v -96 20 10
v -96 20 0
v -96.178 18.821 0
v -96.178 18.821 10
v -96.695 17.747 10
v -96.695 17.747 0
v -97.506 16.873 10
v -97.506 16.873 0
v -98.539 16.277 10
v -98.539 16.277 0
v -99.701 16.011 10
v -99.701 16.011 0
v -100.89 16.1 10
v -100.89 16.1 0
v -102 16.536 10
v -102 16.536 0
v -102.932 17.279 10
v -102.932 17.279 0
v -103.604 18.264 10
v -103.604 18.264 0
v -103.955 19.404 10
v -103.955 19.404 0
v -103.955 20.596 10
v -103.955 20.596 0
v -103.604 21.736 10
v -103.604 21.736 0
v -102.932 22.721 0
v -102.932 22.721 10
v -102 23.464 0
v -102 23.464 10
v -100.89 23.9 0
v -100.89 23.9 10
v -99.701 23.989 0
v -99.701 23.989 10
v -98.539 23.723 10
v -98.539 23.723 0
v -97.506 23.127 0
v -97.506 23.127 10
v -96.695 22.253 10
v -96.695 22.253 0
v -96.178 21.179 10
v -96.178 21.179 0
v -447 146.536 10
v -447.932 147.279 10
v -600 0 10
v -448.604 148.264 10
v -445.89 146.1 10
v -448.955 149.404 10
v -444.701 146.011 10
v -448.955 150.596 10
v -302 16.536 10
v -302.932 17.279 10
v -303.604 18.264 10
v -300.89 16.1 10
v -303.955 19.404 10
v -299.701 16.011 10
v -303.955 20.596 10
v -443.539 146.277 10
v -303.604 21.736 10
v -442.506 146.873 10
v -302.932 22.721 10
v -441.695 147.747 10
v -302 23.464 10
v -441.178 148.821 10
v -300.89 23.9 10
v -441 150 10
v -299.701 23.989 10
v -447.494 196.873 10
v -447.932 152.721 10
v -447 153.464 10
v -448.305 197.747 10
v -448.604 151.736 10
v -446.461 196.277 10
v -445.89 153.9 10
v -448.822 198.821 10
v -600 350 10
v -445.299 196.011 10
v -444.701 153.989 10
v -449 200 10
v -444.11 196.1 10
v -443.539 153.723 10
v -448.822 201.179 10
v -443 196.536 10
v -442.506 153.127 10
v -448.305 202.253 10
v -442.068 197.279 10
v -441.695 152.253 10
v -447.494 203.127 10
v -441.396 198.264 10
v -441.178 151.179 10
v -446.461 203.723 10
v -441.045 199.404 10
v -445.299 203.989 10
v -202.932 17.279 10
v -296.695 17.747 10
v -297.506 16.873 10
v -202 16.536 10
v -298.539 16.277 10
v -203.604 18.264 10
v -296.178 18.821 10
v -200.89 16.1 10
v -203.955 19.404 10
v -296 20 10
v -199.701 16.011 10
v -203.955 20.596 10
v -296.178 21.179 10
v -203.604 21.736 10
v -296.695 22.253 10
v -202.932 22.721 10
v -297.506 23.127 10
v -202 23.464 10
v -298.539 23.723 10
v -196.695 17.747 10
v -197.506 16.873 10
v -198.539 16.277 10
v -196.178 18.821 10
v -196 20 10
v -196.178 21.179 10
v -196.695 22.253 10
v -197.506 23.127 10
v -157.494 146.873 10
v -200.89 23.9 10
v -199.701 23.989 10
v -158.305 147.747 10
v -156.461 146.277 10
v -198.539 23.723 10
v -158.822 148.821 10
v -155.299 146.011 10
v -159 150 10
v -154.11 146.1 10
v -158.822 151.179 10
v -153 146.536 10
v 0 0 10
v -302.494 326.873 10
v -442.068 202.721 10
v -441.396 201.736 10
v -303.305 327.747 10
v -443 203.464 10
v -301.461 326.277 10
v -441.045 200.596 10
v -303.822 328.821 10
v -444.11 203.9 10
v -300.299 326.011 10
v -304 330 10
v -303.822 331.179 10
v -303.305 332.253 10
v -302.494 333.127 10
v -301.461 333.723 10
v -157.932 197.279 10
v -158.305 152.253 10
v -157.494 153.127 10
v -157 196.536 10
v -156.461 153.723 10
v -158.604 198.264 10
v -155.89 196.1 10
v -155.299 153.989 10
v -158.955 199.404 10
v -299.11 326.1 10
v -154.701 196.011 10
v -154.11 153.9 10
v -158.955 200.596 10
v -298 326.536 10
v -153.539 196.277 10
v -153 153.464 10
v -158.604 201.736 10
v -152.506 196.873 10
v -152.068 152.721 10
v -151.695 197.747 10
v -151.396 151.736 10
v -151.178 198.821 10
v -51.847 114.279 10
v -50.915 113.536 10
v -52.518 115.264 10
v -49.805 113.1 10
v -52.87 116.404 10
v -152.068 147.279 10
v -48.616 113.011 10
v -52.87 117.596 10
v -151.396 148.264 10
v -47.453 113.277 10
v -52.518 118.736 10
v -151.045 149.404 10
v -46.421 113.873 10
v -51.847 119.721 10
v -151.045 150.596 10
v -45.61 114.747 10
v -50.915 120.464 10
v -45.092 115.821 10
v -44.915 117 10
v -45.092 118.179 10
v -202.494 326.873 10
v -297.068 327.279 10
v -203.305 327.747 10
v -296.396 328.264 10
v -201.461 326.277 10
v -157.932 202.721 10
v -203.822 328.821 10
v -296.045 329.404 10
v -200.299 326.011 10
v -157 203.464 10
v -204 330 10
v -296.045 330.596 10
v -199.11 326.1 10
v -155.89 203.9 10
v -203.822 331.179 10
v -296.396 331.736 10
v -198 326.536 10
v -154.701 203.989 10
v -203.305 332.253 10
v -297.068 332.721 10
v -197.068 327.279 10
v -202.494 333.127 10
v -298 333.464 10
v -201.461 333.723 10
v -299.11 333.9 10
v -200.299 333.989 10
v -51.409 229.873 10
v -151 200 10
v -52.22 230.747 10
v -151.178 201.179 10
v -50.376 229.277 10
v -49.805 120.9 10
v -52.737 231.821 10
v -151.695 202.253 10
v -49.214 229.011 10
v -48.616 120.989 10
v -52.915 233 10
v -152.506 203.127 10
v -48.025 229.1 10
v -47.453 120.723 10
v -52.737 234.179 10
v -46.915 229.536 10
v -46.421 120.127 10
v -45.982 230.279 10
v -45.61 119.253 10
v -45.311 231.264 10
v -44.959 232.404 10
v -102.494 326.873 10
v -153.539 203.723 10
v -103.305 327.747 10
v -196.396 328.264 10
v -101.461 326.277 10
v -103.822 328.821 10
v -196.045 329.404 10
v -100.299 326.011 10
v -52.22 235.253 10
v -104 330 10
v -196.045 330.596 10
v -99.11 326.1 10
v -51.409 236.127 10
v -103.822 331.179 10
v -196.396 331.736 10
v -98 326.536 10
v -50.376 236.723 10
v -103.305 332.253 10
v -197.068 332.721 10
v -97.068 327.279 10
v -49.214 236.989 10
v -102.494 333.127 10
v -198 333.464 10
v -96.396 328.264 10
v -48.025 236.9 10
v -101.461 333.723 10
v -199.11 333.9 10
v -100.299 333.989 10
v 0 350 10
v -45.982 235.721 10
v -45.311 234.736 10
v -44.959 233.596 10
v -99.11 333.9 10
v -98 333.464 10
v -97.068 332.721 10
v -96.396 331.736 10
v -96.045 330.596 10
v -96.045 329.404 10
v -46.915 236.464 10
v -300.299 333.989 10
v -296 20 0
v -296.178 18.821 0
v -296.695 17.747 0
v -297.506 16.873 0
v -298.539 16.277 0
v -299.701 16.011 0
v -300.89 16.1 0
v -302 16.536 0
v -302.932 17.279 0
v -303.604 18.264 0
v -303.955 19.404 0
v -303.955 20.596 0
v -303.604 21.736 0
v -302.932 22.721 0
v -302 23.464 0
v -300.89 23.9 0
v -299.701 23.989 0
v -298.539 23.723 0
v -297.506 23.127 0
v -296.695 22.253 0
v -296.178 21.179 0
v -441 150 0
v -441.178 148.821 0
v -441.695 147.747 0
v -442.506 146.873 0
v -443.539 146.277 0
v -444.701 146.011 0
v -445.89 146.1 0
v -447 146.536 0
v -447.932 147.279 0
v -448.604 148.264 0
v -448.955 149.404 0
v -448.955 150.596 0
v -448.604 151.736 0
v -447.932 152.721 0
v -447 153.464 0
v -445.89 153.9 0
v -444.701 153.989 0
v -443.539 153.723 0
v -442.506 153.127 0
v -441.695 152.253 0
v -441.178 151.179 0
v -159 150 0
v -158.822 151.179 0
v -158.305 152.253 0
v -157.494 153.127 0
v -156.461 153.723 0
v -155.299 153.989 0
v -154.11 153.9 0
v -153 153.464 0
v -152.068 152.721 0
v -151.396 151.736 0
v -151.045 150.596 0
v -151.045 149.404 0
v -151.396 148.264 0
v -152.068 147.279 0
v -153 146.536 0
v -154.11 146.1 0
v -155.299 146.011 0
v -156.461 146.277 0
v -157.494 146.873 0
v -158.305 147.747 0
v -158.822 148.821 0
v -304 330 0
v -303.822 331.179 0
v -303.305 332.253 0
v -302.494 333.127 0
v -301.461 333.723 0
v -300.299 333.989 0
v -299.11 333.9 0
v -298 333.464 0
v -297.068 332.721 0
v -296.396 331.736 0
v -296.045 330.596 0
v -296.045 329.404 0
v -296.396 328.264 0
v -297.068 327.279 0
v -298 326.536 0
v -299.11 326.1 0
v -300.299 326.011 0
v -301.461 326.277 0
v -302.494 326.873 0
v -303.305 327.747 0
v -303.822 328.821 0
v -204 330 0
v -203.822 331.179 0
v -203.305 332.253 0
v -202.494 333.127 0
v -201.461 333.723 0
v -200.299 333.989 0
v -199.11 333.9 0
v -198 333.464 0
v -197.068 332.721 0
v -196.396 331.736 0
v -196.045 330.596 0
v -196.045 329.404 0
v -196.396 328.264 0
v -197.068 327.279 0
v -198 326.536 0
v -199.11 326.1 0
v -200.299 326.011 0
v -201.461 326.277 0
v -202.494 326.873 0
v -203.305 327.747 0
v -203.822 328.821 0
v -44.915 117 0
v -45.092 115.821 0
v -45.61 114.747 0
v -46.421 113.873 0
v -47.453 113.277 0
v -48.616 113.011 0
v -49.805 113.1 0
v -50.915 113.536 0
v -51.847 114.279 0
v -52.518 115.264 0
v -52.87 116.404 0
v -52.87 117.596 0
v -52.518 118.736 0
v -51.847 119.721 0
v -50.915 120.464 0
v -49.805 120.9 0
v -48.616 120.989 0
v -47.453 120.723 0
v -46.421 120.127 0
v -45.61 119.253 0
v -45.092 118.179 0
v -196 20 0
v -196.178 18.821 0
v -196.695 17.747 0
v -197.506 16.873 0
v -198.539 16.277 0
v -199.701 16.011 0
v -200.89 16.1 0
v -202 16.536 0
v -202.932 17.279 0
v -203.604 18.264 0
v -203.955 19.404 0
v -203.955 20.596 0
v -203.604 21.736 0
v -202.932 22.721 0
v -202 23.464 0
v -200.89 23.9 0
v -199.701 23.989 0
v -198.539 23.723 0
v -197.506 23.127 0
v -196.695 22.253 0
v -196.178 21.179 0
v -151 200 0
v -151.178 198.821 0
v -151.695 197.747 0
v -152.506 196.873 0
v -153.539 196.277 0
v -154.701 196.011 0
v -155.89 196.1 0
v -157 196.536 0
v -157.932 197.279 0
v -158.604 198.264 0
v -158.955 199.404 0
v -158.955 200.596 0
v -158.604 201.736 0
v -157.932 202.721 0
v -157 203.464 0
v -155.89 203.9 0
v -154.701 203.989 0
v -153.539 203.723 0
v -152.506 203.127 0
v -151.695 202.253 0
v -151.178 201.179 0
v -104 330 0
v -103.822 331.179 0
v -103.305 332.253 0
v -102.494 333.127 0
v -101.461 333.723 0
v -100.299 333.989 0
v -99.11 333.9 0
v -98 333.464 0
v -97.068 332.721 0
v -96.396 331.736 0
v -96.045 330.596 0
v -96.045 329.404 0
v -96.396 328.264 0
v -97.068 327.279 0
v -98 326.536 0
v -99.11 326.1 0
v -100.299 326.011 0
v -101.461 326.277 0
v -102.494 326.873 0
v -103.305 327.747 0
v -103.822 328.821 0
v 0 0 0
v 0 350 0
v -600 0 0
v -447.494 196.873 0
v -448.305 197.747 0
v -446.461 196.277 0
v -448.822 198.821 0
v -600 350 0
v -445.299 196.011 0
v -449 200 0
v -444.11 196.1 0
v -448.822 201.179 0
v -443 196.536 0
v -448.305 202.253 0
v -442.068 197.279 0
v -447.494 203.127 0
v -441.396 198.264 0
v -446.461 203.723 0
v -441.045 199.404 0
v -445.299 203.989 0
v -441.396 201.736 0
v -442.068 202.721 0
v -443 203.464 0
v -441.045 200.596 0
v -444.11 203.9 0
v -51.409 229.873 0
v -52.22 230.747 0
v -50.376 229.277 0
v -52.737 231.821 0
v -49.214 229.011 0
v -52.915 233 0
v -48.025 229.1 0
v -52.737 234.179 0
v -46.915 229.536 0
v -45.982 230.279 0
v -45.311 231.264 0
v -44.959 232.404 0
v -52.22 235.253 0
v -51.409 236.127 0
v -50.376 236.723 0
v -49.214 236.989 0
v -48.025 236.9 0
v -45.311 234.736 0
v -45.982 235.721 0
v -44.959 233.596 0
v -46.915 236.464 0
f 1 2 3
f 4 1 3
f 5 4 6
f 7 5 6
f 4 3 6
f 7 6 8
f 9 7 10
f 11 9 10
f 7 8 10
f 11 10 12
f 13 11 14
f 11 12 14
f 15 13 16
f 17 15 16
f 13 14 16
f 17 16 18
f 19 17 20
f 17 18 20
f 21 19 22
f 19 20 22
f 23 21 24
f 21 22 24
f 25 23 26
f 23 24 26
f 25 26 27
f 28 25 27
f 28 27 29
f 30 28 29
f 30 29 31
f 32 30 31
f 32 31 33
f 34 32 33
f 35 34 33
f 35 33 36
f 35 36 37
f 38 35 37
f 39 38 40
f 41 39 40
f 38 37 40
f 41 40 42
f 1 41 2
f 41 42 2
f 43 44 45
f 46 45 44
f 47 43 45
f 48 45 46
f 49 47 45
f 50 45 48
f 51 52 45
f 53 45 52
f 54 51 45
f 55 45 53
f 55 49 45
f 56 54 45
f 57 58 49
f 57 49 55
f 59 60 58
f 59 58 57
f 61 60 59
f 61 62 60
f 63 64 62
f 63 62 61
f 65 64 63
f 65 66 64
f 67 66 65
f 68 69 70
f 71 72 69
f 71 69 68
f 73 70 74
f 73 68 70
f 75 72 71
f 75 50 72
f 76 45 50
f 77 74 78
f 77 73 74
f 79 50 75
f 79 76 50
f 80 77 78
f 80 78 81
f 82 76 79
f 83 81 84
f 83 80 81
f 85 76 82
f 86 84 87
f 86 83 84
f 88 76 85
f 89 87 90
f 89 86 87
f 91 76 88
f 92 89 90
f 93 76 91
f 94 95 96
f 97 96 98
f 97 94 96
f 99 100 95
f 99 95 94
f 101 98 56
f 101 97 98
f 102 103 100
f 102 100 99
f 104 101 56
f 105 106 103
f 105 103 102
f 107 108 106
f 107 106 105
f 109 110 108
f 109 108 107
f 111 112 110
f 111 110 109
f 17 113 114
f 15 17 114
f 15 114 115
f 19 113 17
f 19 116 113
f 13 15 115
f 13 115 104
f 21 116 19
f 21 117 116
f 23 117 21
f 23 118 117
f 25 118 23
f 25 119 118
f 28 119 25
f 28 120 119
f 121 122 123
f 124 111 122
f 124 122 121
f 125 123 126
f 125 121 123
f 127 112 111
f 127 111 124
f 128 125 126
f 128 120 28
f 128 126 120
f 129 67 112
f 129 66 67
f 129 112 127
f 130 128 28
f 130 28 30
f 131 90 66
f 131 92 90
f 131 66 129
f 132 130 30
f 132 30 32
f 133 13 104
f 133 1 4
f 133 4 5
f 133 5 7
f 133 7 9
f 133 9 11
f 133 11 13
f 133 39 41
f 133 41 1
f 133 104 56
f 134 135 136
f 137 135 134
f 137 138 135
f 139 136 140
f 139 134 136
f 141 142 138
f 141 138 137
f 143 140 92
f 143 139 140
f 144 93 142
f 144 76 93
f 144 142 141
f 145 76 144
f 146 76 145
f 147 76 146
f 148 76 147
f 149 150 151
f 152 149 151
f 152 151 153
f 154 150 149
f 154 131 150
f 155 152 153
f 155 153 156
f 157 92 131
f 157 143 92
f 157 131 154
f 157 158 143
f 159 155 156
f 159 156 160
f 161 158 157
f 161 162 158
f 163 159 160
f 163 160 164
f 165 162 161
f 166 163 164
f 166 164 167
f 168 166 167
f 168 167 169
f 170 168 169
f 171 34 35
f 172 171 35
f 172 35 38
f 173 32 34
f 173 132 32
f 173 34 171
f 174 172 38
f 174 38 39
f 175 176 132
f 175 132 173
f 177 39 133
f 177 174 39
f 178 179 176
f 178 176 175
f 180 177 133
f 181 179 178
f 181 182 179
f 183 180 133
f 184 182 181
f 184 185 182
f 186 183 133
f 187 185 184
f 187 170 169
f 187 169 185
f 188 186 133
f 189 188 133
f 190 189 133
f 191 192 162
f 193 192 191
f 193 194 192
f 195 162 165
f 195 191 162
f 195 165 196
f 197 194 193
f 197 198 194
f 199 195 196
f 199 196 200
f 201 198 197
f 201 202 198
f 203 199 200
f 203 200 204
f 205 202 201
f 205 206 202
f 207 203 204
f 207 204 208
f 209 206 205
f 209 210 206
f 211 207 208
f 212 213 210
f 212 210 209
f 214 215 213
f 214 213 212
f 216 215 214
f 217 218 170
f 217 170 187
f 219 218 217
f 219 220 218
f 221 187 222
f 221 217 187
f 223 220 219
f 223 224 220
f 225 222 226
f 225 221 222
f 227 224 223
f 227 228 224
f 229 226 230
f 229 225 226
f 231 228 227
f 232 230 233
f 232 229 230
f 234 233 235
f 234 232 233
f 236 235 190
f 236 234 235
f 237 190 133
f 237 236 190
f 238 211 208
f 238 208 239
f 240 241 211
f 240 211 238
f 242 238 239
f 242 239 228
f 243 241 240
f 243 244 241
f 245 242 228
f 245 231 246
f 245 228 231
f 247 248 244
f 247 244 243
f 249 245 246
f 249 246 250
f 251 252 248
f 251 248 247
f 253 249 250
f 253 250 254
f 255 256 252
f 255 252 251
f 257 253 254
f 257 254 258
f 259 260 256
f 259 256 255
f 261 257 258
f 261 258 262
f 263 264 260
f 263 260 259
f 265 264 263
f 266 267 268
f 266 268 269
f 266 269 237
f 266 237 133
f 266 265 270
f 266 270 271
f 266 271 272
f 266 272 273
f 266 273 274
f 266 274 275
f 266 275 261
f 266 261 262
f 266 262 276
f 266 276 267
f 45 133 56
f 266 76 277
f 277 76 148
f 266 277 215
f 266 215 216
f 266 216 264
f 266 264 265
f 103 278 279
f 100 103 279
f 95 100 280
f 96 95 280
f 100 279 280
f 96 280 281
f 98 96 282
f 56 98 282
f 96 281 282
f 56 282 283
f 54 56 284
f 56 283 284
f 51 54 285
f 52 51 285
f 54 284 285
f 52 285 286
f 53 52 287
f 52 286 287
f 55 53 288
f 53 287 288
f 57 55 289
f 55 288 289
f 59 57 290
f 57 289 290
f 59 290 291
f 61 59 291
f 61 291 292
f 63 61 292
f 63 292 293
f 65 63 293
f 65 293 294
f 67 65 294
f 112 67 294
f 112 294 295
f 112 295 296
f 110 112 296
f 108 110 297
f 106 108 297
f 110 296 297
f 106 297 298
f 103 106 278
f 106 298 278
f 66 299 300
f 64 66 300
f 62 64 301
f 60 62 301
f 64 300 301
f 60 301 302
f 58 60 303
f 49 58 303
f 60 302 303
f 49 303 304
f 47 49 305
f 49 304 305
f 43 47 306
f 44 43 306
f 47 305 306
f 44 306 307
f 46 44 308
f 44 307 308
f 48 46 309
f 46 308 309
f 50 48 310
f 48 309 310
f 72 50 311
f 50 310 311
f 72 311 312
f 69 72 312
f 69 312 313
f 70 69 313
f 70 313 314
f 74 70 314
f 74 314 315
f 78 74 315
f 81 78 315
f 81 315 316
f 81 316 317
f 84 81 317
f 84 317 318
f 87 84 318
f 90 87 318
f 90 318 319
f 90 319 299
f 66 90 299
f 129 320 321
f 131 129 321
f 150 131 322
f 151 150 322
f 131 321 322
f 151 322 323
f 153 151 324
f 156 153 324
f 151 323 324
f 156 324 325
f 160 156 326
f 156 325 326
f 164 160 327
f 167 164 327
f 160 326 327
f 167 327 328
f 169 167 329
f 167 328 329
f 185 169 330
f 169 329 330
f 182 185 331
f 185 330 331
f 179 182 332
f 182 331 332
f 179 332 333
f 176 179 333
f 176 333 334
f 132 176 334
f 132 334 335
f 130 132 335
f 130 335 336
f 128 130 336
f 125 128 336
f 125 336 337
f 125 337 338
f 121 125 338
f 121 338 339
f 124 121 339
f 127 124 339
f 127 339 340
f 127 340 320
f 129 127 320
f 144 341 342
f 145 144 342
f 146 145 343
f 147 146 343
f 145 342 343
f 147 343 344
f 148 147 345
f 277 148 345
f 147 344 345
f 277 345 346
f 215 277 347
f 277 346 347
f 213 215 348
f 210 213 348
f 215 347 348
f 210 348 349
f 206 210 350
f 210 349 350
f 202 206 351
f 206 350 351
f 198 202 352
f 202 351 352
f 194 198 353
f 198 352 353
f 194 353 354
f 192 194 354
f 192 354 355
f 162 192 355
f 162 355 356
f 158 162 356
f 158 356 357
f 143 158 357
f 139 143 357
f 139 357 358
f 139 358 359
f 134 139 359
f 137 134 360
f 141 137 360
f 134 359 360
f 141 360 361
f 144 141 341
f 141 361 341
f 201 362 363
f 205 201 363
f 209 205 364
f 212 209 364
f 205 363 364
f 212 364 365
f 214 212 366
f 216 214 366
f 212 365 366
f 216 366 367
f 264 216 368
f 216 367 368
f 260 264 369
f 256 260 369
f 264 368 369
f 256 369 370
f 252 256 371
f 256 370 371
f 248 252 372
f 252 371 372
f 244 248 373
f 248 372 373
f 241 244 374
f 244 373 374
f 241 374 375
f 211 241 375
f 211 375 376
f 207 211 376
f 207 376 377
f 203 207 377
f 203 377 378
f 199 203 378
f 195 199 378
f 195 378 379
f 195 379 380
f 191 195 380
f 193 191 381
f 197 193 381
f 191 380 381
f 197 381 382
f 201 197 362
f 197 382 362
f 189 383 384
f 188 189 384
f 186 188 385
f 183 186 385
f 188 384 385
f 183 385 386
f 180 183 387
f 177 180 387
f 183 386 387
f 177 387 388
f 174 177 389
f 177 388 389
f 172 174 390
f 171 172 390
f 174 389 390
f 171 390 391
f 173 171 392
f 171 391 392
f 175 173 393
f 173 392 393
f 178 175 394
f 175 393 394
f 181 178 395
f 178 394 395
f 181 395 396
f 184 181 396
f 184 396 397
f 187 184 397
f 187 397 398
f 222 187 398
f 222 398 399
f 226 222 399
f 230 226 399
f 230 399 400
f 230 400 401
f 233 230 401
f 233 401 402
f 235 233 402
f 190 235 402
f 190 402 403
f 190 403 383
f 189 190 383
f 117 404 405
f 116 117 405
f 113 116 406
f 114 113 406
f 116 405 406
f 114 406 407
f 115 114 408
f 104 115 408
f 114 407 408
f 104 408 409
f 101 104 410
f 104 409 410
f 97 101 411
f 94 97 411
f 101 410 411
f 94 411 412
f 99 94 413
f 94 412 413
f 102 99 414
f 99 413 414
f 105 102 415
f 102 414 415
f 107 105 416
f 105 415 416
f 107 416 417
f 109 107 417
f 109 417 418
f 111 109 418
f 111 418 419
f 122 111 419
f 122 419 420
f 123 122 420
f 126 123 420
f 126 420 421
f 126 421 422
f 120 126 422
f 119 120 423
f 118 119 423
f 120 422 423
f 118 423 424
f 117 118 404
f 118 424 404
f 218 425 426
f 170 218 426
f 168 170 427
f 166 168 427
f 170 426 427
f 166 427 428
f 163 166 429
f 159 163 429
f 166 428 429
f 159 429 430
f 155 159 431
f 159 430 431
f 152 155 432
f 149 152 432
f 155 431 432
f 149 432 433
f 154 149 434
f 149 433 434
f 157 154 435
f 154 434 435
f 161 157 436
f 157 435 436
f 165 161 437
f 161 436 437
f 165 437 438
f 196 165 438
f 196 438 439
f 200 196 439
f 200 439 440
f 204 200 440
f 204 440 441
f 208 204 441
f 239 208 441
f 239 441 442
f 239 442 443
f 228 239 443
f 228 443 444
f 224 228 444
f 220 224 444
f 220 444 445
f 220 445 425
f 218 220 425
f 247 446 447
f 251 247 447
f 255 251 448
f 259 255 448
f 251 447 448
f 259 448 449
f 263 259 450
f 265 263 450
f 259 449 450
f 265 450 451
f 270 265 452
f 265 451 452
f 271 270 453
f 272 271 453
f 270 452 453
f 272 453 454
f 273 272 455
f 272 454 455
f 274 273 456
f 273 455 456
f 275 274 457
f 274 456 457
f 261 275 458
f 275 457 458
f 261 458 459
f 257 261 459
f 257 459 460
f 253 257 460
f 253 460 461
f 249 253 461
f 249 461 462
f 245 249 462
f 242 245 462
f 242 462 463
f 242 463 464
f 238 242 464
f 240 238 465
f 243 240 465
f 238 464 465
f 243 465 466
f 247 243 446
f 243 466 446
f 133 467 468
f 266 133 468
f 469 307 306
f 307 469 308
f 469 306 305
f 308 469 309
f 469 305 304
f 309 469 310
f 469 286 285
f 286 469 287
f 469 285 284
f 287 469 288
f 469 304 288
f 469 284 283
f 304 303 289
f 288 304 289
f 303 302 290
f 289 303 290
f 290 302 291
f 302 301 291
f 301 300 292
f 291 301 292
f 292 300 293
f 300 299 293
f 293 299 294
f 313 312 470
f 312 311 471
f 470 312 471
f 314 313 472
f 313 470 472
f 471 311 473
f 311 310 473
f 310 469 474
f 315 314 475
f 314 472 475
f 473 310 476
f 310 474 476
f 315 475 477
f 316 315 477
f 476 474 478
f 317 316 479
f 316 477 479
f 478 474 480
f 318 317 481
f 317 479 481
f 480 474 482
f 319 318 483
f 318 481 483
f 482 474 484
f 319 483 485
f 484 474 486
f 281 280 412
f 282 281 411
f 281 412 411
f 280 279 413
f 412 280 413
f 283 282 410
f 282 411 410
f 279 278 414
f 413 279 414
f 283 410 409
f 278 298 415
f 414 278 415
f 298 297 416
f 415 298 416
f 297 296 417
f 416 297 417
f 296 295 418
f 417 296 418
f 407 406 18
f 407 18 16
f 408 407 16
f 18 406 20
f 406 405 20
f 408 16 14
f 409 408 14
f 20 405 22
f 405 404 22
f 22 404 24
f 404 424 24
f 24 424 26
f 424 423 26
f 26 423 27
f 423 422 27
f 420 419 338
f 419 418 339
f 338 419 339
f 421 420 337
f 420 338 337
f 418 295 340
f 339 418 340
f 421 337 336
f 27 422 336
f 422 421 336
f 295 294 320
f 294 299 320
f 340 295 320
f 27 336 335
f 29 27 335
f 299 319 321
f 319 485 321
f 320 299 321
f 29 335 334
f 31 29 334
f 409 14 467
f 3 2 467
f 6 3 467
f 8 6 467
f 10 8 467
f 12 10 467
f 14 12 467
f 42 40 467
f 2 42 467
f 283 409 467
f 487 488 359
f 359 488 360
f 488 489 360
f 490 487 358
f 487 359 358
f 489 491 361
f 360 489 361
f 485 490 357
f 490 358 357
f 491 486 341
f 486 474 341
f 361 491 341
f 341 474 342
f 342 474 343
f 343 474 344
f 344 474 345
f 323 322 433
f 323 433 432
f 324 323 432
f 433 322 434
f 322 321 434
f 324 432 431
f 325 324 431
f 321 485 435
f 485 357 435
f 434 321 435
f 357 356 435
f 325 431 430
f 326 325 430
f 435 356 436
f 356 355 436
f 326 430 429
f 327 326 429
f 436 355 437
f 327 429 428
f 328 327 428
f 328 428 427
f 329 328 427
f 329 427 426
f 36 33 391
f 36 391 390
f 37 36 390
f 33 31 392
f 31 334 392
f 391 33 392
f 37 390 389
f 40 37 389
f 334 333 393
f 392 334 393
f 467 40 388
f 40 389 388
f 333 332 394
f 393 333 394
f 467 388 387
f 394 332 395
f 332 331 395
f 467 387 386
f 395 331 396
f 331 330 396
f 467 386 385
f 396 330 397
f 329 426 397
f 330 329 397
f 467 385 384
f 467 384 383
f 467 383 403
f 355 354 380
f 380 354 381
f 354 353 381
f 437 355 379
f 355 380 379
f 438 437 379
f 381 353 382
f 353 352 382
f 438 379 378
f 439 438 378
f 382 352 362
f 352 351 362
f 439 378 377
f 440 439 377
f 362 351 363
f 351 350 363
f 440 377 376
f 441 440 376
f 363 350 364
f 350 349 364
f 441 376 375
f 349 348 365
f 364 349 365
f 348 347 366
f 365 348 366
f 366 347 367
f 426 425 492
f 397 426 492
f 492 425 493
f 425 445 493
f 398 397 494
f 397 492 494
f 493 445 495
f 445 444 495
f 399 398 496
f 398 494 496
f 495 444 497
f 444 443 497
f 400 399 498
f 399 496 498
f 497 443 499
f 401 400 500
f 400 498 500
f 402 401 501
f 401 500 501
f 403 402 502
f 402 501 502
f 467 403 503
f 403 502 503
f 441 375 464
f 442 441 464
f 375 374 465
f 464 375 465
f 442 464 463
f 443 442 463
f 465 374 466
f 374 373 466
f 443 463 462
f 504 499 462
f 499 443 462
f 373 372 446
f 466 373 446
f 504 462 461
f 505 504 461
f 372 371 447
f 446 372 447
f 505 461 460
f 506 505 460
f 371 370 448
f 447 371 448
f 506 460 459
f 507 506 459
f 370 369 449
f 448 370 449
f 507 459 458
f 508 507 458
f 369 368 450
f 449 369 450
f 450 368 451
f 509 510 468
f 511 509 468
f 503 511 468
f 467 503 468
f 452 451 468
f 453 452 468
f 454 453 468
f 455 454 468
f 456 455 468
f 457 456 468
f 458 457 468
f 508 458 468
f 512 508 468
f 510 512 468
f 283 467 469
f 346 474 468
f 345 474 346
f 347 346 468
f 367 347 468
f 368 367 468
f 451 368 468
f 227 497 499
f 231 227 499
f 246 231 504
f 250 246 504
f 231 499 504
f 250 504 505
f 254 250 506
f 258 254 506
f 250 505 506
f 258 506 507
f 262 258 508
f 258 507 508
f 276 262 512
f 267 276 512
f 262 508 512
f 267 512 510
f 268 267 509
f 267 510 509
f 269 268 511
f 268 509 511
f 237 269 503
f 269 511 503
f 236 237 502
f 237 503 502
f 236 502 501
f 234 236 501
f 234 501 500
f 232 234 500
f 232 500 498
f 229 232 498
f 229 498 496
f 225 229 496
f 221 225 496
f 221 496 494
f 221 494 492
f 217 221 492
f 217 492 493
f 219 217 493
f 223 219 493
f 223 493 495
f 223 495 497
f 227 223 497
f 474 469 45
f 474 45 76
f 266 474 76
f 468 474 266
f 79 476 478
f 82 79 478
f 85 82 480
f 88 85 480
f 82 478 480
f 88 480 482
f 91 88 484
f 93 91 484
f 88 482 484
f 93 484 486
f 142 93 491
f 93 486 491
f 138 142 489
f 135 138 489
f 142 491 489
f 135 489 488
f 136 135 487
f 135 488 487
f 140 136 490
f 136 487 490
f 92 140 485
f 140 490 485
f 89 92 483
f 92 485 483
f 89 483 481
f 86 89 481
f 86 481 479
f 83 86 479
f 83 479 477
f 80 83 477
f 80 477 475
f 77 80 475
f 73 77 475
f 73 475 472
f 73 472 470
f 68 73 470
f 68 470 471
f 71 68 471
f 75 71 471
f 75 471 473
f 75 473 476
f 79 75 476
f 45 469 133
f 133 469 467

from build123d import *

# Parameters (mm, degrees)
SKETCH1_W           = 600
SKETCH1_H           = 350
BOSS_EXTRUDE1_DEPTH = 10
SKETCH2_R           = 4
CUT_EXTRUDE1_DEPTH  = 10
SKETCH9_R           = 4
CUT_EXTRUDE4_DEPTH  = 695.694177318
CUT_EXTRUDE5_REACH  = 696.694
SKETCH4_R           = 4


with BuildPart() as part:
    # Sketch1 → Boss-Extrude1 (new body)
    with BuildSketch(Plane.XY):
        with Locations((-300, 175)):
            Rectangle(SKETCH1_W, SKETCH1_H)
    extrude(amount=BOSS_EXTRUDE1_DEPTH)

    # Sketch2 → Cut-Extrude1 (cut)
    with BuildSketch(Plane(origin=(0, 0, 0), x_dir=(-1, 0, 0), z_dir=(0, 0, -1))):
        with Locations((100, 330)):
            Circle(SKETCH2_R)
        with Locations((200, 330)):
            Circle(SKETCH2_R)
        with Locations((300, 330)):
            Circle(SKETCH2_R)
        with Locations(Location((300, 20, 0), (0, 0, 180))):
            Circle(SKETCH2_R)
        with Locations(Location((200, 20, 0), (0, 0, 180))):
            Circle(SKETCH2_R)
        with Locations(Location((100, 20, 0), (0, 0, 180))):
            Circle(SKETCH2_R)
    extrude(amount=-CUT_EXTRUDE1_DEPTH, mode=Mode.SUBTRACT)

    # Sketch9 → Cut-Extrude4 (cut, through all)
    with BuildSketch(Plane(origin=(0, 0, 0), x_dir=(-1, 0, 0), z_dir=(0, 0, -1))):
        with Locations((48.91459754, 233)):
            Circle(SKETCH9_R)
        with Locations(Location((48.91459754, 117, 0), (0, 0, 180))):
            Circle(SKETCH9_R)
    extrude(amount=-CUT_EXTRUDE4_DEPTH, mode=Mode.SUBTRACT)

    # Sketch4 → Cut-Extrude5 (cut, up to next)
    with BuildSketch(Plane(origin=(0, 0, 0), x_dir=(-1, 0, 0), z_dir=(0, 0, -1)), mode=Mode.PRIVATE) as cut_extrude5_sk1:
        with Locations((155, 150)):
            Circle(SKETCH4_R)
    cut_extrude5_tool1 = extrude(cut_extrude5_sk1.sketch, amount=-CUT_EXTRUDE5_REACH, mode=Mode.PRIVATE) & part.part
    # Sketch4 → Cut-Extrude5 (cut, up to next)
    with BuildSketch(Plane(origin=(0, 0, 0), x_dir=(-1, 0, 0), z_dir=(0, 0, -1)), mode=Mode.PRIVATE) as cut_extrude5_sk2:
        with Locations(Location((155, 200, 0), (0, 0, 180))):
            Circle(SKETCH4_R)
    cut_extrude5_tool2 = extrude(cut_extrude5_sk2.sketch, amount=-CUT_EXTRUDE5_REACH, mode=Mode.PRIVATE) & part.part
    # Sketch4 → Cut-Extrude5 (cut, up to next)
    with BuildSketch(Plane(origin=(0, 0, 0), x_dir=(-1, 0, 0), z_dir=(0, 0, -1)), mode=Mode.PRIVATE) as cut_extrude5_sk3:
        with Locations(Location((445, 150, 0), (0, 0, 180))):
            Circle(SKETCH4_R)
    cut_extrude5_tool3 = extrude(cut_extrude5_sk3.sketch, amount=-CUT_EXTRUDE5_REACH, mode=Mode.PRIVATE) & part.part
    # Sketch4 → Cut-Extrude5 (cut, up to next)
    with BuildSketch(Plane(origin=(0, 0, 0), x_dir=(-1, 0, 0), z_dir=(0, 0, -1)), mode=Mode.PRIVATE) as cut_extrude5_sk4:
        with Locations((445, 200)):
            Circle(SKETCH4_R)
    cut_extrude5_tool4 = extrude(cut_extrude5_sk4.sketch, amount=-CUT_EXTRUDE5_REACH, mode=Mode.PRIVATE) & part.part
    add(cut_extrude5_tool1.solids().sort_by_distance((-155, 150, 0))[0], mode=Mode.SUBTRACT)
    add(cut_extrude5_tool2.solids().sort_by_distance((-155, 200, 0))[0], mode=Mode.SUBTRACT)
    add(cut_extrude5_tool3.solids().sort_by_distance((-445, 150, 0))[0], mode=Mode.SUBTRACT)
    add(cut_extrude5_tool4.solids().sort_by_distance((-445, 200, 0))[0], mode=Mode.SUBTRACT)


solid = part.part
